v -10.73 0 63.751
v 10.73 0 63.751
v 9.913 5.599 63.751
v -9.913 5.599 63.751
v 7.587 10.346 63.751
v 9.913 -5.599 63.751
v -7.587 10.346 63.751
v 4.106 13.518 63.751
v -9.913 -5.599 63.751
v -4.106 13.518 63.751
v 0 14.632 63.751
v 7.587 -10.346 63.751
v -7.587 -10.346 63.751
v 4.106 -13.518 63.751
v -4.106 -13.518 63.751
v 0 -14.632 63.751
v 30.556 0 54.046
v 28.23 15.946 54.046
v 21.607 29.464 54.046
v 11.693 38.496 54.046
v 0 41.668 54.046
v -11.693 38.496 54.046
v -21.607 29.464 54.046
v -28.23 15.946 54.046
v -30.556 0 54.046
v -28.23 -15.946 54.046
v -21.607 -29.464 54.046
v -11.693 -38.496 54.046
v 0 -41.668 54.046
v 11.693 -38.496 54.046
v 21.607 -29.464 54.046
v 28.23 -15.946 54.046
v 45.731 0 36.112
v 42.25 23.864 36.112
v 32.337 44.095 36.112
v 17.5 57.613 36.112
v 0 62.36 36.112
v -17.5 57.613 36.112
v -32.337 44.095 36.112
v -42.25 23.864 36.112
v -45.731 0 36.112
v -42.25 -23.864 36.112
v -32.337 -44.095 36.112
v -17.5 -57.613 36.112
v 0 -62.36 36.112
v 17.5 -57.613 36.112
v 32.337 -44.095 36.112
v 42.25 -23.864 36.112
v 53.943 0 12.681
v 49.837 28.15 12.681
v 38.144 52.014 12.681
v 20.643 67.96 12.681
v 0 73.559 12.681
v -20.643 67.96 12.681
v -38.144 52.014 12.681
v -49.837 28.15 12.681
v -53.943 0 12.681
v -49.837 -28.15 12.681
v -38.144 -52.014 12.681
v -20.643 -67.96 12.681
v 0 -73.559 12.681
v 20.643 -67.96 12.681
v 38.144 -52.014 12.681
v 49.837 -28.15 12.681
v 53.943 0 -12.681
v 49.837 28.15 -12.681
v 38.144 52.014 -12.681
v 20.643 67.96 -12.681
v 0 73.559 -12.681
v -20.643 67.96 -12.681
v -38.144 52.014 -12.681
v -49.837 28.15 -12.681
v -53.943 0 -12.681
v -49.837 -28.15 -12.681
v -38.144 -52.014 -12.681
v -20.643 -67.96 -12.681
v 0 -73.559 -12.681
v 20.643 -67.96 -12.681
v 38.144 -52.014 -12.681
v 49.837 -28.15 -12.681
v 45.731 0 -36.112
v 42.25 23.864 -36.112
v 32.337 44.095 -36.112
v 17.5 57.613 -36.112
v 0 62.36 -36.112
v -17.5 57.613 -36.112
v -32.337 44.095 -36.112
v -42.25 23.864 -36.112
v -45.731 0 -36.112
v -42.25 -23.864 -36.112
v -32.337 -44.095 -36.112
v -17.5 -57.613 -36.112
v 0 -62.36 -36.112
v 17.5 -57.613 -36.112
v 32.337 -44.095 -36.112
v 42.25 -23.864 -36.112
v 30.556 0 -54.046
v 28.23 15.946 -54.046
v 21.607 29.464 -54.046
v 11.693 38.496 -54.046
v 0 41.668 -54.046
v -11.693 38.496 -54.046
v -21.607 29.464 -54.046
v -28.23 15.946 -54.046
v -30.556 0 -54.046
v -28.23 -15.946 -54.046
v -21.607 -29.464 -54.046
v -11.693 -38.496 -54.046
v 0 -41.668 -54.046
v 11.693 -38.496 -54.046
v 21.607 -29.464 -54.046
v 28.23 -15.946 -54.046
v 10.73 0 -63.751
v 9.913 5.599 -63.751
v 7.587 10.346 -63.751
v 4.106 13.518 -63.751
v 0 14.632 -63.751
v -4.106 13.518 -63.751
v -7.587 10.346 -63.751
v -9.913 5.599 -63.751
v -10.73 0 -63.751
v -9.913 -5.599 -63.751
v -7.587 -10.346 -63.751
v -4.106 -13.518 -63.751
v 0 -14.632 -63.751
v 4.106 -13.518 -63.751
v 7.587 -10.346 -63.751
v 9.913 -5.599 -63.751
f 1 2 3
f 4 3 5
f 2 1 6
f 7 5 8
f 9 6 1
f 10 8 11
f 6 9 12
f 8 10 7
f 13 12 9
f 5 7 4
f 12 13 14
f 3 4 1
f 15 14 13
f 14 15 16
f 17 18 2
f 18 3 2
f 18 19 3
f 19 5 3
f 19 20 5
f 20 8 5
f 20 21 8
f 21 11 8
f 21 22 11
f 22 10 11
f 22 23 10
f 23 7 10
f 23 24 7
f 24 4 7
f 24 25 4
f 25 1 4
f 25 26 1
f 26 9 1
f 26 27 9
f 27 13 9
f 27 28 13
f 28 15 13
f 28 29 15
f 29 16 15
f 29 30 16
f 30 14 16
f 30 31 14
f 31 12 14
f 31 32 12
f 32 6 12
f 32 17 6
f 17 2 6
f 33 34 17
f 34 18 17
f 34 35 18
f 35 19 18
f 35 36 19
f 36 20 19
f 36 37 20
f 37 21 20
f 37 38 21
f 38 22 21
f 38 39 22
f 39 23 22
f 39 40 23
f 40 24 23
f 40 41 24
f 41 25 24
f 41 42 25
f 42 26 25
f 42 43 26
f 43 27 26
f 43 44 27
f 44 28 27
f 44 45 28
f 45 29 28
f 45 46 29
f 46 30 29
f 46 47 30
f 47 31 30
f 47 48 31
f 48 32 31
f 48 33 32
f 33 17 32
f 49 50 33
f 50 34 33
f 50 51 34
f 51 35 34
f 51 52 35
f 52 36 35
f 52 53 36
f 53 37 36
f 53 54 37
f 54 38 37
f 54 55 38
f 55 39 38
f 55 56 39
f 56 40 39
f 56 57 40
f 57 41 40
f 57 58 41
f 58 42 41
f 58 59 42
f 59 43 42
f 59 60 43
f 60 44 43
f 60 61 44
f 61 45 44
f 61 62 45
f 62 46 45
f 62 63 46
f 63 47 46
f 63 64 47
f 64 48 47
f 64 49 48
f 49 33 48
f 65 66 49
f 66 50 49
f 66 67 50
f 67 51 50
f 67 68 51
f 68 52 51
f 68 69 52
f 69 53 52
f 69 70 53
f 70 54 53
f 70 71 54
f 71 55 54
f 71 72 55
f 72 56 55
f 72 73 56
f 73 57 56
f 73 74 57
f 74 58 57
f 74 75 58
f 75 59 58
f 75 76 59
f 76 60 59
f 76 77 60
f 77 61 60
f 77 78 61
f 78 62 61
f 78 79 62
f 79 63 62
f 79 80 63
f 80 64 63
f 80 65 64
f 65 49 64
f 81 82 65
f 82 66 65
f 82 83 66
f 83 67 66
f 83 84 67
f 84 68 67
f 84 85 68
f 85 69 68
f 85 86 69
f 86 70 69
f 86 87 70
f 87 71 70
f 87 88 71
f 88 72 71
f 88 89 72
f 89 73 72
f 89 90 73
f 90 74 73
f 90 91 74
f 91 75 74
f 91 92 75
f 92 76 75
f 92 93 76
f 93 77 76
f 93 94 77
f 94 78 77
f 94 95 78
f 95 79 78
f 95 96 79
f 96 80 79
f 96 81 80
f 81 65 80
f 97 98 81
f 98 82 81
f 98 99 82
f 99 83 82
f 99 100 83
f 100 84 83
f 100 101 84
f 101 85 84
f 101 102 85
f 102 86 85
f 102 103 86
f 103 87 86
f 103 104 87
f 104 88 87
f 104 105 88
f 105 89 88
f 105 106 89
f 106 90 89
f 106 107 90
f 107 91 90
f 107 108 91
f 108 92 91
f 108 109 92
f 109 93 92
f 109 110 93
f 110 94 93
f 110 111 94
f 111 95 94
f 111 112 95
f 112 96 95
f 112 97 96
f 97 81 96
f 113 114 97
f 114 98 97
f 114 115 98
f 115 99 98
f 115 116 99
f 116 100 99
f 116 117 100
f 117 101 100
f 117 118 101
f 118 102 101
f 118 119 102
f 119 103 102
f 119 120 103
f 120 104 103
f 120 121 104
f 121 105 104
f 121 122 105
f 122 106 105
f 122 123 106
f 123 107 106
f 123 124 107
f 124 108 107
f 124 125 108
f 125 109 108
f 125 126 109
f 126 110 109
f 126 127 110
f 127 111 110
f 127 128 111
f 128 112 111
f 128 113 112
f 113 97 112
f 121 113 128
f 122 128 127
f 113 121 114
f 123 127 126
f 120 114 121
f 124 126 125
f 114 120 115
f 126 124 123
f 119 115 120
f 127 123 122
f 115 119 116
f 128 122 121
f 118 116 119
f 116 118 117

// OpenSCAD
// Generated by SolidPython 1.0.1 on 2020-07-29 00:46:50


scale(v = [11, 15, 13]) {
	sphere(r = 5);
}
/***********************************************
*********      SolidPython code:      **********
************************************************
 
# import packages: SolidPython
from solid import *
from solid.utils import *
from itertools import chain, combinations, permutations


class Resize:

    def __init__(self, scad_file):
        self.scad_file = scad_file
        #self.scad_file = import_scad(scad_file)
        # cone/cylinder param:
        self.r1 = 0
        self.r2 = 0
        self.h = 0
        # rectangular prism param:
        self.w = 0
        self.l = 0
        # ellipse param:
        self.r = 0

    # import OpenScad code (file name corresponds to shape)


    # classify shape + parameters
    def assign(self, param1, param2, param3):
        if self.scad_file == 'cone.scad':
            self.r1 = param1
            self.r2 = param2
            self.h = param3
        elif self.scad_file == 'cylinder.scad':
            self.r1 = param1
            self.r2 = param2
            self.h = param3
        elif self.scad_file == 'rectangularPrism.scad':
            self.h = param1
            self.l = param2
            self.w = param3
        else:
            self.r = param1
            self.h = param2

    # resize parameters
    def iterate(self):
        x = range(3, 20, 2)
        i = 1
        if self.scad_file == 'cone.scad':
            tempList = list(permutations(x, 2))
            for temp in tempList:
                param1 = temp[0]
                param2 = temp[1]
                filepath = 'produced_scad_files/' + 'cone' + str(param1) + '_' + str(param2) + '_' + '.scad'
                scad_render_to_file(cylinder(h=param1, r1=param2, r2=0), filepath)

        elif self.scad_file == 'cylinder.scad':
            tempList = list(permutations(x, 3))
            for temp in tempList:
                param1 = temp[0]
                param2 = temp[1]
                filepath = 'produced_scad_files/' + 'cylinder' + str(param1) + '_' + str(param2) + '_' + '.scad'
                scad_render_to_file(cylinder(h=param1, r1=param2, r2=param2), filepath)

        elif self.scad_file == 'rectangularPrism.scad':
            tempList = list(permutations(x, 3))
            for temp in tempList:
                param1 = temp[0]
                param2 = temp[1]
                param3 = temp[2]
                filepath = 'produced_scad_files/' + 'rectangularPrism' + str(param1) + '_' + str(param2) + '_' + str(
                    param3) + '.scad'
                scad_render_to_file(cube(size=(param1, param2, param3)), filepath)

        elif self.scad_file == 'ellipse.scad':
            tempList = list(permutations(x, 4))
            for temp in tempList:
                param1 = temp[0]
                param2 = temp[1]
                param3 = temp[2]
                param4 = temp[3]
                filepath = 'produced_scad_files/' + 'ellipse' + str(param1) + '_' + str(param2) + '_' + str(param3) + '_' + str(param4) + '.scad'
                scad_render_to_file(scale([param1, param2, param3])(sphere(r=param4)), filepath)

    def render_to_scadfile(self):
        scad_render_to_file(scad, 'example.scad') 
 
************************************************/
